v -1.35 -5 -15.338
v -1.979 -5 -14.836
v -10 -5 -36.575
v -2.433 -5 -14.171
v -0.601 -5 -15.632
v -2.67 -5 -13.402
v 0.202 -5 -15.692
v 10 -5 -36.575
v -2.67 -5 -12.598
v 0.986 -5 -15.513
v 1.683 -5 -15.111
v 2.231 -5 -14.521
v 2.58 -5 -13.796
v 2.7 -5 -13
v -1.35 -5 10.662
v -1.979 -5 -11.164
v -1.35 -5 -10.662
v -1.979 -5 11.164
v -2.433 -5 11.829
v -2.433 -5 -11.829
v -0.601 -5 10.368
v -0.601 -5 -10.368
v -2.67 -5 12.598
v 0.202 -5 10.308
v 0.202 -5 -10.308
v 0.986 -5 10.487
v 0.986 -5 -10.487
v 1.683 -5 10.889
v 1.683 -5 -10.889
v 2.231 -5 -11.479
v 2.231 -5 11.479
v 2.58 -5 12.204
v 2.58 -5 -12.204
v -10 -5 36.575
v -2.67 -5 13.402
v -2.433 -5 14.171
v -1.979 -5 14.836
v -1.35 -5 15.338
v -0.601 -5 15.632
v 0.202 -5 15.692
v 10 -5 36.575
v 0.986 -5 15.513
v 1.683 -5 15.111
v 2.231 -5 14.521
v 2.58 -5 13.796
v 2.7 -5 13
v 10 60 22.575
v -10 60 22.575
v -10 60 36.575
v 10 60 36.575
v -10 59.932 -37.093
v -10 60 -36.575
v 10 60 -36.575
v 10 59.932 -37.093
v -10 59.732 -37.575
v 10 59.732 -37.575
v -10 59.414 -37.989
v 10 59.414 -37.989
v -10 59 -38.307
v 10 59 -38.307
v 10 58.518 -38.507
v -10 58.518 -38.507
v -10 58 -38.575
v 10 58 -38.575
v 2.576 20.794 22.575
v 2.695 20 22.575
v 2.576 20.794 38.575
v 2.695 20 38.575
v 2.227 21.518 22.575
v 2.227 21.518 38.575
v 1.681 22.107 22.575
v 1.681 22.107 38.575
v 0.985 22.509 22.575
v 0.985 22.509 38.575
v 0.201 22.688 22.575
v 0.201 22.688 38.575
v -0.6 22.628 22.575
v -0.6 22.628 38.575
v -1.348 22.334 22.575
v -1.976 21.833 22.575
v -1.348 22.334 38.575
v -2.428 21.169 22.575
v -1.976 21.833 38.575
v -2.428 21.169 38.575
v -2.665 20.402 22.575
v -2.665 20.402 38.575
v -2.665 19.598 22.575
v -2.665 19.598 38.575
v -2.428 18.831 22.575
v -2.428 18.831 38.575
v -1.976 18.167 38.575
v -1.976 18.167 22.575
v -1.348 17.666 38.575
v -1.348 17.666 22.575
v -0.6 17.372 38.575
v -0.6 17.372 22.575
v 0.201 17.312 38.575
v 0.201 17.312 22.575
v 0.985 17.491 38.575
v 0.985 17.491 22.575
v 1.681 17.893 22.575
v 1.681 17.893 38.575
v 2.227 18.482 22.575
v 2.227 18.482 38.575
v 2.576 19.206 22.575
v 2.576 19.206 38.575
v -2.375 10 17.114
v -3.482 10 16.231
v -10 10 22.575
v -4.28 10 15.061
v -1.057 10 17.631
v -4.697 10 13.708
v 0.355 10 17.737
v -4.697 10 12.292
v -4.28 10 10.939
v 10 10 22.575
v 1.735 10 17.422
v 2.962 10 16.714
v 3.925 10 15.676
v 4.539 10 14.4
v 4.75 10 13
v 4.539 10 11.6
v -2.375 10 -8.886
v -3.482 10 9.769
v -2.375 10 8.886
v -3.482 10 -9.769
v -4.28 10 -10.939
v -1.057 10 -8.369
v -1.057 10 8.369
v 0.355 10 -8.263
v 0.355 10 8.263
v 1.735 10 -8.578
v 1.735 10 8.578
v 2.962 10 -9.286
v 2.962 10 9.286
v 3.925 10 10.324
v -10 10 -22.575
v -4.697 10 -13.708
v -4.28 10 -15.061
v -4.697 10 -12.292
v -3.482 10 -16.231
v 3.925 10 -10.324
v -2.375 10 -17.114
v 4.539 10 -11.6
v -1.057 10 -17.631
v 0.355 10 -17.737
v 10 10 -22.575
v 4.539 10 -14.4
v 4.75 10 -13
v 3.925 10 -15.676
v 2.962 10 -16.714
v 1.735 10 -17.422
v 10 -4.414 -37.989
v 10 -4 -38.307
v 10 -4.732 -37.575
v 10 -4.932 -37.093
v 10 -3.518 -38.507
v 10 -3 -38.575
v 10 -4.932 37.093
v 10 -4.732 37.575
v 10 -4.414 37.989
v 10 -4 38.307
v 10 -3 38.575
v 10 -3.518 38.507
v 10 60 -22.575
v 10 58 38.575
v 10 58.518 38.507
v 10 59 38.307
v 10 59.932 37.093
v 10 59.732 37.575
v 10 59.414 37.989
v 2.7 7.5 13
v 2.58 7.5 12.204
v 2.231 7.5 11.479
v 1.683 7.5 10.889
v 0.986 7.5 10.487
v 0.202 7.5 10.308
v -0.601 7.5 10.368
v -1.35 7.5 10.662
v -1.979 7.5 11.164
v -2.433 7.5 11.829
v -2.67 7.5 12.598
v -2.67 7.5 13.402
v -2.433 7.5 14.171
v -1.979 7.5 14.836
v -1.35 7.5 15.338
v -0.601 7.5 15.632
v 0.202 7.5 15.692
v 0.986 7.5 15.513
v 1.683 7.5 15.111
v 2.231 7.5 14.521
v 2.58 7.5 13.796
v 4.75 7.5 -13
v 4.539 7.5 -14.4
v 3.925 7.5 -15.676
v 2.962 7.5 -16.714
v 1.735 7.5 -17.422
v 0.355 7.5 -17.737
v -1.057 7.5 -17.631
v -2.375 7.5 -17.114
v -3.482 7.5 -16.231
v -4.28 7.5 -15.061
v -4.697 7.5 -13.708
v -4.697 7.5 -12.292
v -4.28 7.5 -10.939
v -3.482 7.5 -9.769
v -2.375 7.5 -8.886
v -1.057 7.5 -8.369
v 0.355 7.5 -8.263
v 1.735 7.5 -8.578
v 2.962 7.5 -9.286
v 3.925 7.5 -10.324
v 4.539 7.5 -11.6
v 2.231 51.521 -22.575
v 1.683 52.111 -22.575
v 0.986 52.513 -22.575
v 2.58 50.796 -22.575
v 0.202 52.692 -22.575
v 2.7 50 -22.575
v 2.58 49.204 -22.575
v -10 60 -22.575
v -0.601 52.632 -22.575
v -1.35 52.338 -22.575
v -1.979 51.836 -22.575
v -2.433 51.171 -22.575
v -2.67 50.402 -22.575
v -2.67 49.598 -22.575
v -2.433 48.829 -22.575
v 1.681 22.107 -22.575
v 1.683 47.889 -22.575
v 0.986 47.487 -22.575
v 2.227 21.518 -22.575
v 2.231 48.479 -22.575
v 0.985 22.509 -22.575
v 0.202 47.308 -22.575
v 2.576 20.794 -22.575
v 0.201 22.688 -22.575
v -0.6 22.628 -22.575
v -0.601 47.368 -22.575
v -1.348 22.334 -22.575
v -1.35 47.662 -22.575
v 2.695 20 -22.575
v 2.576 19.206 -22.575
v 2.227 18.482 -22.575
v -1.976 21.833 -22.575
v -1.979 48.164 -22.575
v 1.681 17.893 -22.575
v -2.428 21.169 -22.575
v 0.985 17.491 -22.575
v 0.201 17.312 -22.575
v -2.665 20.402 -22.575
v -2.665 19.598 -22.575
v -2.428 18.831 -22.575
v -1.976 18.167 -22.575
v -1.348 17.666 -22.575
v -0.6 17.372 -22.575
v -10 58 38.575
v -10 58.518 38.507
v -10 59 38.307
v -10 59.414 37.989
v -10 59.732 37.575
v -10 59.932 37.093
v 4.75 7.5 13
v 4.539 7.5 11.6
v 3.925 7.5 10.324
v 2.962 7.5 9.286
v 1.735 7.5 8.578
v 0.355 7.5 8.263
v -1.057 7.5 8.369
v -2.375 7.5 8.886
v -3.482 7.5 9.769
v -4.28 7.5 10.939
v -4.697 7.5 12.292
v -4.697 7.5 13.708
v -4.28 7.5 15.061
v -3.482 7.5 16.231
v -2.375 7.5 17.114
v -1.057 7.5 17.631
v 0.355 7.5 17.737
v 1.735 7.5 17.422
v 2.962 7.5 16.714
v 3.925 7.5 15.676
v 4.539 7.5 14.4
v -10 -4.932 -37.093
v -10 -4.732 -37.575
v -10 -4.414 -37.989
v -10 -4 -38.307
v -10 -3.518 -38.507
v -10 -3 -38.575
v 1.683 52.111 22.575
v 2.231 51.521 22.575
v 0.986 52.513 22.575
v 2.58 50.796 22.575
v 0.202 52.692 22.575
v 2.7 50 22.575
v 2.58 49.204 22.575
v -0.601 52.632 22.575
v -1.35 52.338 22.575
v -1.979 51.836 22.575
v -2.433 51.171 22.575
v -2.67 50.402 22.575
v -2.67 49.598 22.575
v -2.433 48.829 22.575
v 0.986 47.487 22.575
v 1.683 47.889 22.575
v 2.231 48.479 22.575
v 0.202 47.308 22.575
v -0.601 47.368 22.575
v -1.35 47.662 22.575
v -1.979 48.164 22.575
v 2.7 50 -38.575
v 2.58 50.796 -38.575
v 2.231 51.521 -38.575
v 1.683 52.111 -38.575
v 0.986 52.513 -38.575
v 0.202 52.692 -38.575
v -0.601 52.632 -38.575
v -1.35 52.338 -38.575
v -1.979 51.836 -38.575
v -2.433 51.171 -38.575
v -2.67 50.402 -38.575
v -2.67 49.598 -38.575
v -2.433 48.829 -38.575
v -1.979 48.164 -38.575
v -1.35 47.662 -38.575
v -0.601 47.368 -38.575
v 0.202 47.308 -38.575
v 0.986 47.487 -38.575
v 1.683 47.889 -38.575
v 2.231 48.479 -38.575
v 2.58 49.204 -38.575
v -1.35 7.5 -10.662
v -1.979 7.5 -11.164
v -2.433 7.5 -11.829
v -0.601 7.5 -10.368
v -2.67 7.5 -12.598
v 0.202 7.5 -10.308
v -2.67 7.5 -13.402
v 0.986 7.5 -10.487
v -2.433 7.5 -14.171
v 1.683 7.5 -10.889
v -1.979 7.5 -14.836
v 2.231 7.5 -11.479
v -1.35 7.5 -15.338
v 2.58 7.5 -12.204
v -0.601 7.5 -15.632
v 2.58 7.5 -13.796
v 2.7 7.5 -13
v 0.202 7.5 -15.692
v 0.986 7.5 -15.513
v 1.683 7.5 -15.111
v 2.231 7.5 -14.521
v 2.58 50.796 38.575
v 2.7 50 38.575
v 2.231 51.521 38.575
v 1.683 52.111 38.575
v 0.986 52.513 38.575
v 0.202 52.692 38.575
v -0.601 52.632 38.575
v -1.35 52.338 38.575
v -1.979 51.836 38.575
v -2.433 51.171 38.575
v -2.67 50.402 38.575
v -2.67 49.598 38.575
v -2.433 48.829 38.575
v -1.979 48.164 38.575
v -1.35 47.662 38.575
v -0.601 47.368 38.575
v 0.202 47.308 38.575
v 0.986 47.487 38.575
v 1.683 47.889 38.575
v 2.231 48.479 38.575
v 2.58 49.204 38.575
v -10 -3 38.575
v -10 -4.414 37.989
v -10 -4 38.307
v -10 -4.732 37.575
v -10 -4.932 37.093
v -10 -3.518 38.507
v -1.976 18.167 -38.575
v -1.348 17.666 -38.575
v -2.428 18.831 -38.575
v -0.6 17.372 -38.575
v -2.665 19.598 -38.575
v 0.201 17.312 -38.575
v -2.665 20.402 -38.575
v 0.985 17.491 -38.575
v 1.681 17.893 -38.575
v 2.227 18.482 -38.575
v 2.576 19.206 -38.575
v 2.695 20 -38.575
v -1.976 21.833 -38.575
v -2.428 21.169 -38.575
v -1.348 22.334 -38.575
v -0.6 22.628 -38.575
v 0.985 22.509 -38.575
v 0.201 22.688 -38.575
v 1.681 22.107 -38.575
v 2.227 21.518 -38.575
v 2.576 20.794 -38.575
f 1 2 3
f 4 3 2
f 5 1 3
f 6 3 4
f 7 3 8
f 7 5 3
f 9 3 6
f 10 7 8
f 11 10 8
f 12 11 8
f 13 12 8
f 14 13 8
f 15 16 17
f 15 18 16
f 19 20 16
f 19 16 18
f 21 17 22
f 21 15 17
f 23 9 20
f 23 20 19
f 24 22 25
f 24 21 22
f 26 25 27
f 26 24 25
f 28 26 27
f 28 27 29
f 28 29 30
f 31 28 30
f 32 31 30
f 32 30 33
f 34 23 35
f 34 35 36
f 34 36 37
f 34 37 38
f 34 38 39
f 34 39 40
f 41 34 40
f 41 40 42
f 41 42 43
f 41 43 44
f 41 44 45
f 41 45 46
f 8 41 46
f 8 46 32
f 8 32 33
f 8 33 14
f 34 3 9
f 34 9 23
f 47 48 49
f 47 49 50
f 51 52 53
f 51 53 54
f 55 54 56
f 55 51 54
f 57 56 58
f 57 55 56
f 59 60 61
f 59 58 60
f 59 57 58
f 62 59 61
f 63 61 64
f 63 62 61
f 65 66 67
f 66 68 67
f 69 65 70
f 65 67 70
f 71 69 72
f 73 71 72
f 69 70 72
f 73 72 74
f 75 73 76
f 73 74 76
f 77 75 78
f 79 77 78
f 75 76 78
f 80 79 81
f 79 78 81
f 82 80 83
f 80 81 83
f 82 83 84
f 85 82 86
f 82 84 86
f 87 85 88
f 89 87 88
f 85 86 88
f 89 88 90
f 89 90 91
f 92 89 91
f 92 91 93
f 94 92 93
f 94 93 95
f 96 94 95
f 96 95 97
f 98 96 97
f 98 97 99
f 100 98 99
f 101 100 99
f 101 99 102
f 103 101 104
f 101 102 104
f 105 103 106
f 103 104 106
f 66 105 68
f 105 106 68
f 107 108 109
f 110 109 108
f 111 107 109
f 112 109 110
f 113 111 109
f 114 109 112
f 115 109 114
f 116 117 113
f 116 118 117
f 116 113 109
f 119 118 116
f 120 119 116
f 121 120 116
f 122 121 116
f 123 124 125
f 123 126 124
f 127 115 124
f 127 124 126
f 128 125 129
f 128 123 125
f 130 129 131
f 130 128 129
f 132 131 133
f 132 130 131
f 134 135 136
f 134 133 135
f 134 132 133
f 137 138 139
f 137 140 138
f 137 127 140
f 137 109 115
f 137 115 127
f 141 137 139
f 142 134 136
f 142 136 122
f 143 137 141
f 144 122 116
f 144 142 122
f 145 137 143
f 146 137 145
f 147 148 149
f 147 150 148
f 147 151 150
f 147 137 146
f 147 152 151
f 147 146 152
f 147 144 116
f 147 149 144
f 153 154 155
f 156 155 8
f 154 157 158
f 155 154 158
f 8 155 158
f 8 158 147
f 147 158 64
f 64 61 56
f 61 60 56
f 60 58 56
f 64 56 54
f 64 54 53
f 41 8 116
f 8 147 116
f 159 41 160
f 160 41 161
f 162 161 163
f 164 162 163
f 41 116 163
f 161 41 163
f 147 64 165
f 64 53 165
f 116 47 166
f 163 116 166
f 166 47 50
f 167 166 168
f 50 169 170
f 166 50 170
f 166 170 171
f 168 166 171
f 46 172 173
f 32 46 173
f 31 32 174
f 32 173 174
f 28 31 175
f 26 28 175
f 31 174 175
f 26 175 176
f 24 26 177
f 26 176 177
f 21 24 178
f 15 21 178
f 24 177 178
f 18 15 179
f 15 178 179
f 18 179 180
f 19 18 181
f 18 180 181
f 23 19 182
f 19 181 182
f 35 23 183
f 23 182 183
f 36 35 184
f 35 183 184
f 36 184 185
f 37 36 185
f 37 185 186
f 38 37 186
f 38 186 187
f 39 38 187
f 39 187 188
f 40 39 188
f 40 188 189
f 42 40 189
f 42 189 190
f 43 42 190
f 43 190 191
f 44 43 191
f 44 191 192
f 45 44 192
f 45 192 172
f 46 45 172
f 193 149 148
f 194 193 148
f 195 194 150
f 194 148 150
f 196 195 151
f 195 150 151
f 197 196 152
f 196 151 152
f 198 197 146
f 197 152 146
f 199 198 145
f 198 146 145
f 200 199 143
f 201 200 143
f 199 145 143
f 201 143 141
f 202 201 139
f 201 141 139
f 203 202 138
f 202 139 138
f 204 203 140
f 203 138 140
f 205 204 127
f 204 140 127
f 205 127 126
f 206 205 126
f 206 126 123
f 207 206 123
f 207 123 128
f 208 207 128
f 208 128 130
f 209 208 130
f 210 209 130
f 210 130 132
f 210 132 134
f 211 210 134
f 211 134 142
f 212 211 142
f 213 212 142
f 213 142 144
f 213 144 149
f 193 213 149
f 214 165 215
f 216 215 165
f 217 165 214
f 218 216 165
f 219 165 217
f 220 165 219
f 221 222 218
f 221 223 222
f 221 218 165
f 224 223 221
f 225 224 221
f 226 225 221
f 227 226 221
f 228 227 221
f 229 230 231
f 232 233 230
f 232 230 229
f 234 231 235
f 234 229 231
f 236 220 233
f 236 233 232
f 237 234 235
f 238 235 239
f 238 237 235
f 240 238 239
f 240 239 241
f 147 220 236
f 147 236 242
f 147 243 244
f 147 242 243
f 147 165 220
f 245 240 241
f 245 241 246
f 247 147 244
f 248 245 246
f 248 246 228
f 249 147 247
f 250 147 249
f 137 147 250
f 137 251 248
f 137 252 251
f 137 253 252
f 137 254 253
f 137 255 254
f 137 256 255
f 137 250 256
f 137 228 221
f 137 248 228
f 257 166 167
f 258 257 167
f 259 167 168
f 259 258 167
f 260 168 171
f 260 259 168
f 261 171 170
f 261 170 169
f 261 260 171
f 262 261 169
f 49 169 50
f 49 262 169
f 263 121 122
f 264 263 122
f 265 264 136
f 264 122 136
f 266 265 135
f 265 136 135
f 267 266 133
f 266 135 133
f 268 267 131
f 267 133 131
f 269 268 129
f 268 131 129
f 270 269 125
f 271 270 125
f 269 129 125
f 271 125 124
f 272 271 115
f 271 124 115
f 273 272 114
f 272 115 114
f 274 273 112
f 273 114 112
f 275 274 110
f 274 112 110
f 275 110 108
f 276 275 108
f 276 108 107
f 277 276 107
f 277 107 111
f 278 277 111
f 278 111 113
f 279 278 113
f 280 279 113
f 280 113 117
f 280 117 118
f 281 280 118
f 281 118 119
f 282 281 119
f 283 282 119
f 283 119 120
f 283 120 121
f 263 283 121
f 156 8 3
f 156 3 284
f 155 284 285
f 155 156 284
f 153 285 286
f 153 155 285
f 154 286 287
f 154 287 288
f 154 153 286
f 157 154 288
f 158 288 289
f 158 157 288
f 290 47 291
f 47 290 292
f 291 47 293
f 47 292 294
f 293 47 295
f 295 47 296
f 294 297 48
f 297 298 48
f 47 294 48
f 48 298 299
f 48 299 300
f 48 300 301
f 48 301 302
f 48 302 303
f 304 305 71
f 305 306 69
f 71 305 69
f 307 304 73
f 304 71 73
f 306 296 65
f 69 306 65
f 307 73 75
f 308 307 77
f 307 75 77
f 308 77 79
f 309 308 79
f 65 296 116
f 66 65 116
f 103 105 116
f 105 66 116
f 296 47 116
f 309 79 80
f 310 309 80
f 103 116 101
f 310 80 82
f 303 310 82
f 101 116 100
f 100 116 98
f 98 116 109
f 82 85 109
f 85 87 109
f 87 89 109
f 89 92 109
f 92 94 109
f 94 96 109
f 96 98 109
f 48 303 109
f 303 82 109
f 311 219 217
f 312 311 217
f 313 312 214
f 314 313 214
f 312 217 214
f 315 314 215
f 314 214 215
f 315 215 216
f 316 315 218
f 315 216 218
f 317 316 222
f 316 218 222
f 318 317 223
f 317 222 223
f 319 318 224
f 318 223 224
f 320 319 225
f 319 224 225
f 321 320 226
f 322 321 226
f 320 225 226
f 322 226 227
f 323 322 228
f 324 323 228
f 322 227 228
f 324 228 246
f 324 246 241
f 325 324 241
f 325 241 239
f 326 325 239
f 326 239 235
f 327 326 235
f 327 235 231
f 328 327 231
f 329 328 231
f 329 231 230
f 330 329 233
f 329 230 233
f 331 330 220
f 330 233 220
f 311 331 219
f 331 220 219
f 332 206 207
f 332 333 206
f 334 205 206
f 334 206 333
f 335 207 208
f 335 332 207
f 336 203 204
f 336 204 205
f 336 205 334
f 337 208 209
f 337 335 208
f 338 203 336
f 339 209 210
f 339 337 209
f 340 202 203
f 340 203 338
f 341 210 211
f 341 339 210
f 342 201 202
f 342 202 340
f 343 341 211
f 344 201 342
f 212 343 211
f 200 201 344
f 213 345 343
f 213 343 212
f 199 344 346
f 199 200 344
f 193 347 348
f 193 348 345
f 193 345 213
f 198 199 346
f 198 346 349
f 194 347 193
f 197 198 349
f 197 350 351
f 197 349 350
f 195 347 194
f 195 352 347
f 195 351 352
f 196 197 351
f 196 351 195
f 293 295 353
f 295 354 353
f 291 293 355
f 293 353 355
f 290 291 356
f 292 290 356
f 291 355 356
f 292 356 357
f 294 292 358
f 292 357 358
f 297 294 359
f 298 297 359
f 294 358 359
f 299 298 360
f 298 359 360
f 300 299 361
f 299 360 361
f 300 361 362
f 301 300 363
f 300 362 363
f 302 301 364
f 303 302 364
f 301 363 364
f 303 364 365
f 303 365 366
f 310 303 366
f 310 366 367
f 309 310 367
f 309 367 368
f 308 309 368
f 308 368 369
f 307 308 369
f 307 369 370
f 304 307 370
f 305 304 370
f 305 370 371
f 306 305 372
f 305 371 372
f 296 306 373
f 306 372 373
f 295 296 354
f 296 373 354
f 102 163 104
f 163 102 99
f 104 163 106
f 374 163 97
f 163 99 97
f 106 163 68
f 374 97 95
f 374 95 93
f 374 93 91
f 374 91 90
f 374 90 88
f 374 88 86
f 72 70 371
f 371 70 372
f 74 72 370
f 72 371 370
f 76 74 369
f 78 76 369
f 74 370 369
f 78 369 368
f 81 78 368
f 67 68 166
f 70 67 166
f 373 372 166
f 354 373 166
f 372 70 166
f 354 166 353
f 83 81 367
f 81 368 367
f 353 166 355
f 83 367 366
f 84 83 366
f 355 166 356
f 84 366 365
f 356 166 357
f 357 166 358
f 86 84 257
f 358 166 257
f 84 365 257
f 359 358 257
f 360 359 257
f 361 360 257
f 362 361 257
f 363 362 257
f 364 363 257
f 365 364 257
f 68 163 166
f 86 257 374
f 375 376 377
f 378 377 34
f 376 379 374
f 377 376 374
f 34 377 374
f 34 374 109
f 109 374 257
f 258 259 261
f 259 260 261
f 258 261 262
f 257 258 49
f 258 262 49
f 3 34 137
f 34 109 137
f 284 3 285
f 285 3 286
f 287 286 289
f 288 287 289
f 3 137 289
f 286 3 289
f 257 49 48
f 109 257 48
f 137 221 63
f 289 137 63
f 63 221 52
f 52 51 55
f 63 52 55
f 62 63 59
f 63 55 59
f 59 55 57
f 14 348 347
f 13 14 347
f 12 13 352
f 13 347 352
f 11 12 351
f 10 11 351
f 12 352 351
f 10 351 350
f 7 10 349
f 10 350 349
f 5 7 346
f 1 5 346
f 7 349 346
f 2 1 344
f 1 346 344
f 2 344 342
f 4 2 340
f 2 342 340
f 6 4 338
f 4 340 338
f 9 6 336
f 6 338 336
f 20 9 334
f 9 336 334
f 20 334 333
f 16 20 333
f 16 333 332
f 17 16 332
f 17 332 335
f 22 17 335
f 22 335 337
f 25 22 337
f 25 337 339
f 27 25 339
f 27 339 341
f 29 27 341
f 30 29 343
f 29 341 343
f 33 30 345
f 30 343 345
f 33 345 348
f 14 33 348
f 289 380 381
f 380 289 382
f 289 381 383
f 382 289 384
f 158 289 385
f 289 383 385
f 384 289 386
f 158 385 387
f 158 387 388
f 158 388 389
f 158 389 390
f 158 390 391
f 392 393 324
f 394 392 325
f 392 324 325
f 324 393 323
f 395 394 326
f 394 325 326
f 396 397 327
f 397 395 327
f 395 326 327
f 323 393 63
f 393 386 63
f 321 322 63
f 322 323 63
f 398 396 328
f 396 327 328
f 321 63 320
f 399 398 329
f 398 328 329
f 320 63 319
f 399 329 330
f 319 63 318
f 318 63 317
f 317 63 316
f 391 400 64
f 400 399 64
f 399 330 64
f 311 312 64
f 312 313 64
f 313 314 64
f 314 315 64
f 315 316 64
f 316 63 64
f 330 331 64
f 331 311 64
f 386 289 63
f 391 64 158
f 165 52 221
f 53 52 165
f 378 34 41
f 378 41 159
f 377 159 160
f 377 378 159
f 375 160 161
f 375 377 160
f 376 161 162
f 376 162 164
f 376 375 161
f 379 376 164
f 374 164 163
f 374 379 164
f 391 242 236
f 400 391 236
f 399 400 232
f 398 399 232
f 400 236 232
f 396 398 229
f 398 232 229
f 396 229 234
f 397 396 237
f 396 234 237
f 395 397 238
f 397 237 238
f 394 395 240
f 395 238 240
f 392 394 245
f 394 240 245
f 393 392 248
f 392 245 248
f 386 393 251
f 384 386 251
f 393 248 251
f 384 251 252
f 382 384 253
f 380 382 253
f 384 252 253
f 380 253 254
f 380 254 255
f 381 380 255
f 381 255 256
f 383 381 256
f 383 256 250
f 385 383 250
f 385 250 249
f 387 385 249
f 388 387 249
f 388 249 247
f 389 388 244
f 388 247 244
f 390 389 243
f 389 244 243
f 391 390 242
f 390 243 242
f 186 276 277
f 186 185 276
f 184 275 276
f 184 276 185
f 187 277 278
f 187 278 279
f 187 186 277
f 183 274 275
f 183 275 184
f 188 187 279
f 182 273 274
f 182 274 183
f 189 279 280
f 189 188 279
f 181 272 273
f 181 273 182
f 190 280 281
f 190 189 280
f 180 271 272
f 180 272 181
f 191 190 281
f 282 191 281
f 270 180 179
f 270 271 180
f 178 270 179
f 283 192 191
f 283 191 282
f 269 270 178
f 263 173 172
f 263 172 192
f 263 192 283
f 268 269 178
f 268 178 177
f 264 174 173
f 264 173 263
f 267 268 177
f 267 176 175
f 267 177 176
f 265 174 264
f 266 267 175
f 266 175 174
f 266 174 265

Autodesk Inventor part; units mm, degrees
ref_plane "YZ Plane" through (0, 0, 0) normal (1, 0, 0) x (0, 1, 0)
ref_plane "XZ Plane" through (0, 0, 0) normal (0, 1, 0) x (-1, 0, 0)
ref_plane "XY Plane" through (0, 0, 0) normal (0, 0, 1) x (1, 0, 0)
sketch "Boceto1" plane through (0, 0, 0) normal (0, 1, 0) x (-1, 0, 0)
  line L0 (-6.45, 25.5) -> (6.45, 25.5)
  line L1 (6.45, 25.5) -> (6.45, -25.5)
  line L2 (6.45, -25.5) -> (-6.45, -25.5)
  line L3 (-6.45, -25.5) -> (-6.45, 25.5)
  line L4 (-6.45, 25.5) -> (6.45, -25.5) construction
  line L5 (6.45, 25.5) -> (-6.45, -25.5) construction
  circle A0 centre (0, 0) radius 3.5
  dimension "d0" = 7
  dimension "d1" = 51
  dimension "d2" = 12.9
extrude "Extrusión1" add sketch "Boceto1" along normal blind 10
sketch "Boceto2" plane through (0, 10, 0) normal (0, 1, 0) x (1, 0, 0)
  circle A0 centre (0, 0) radius 6
  dimension "d5" = 12
extrude "Extrusión2" cut sketch "Boceto2" against normal blind 6
sketch "Boceto3" plane through (0, 10, 0) normal (0, 1, 0) x (1, 0, 0)
  circle A0 centre (0, 0) radius 6 projected
  line L0 (6.45, 25.5) -> (-6.45, 25.5) projected
  line L1 (-6.45, 25.5) -> (-6.45, -25.5) projected
  line L2 (-6.45, -25.5) -> (6.45, -25.5) projected
  line L3 (6.45, -25.5) -> (6.45, 25.5) projected
  line L4 (10, -38.575) -> (-10, -38.575)
  line L5 (-10, -38.575) -> (-10, 38.575)
  line L6 (-10, 38.575) -> (10, 38.575)
  line L7 (10, 38.575) -> (10, -38.575)
  line L8 (10, -38.575) -> (-10, 38.575) construction
  line L9 (-10, -38.575) -> (10, 38.575) construction
  dimension "d21" = 20
  dimension "d22" = 77.15
extrude "Extrusión3" add sketch "Boceto3" against normal blind 15 contours L4 L5 L6 L7
sketch "Boceto4" plane through (0, 10, 0) normal (0, 1, 0) x (1, 0, 0)
  line L0 (10, -38.575) -> (-10, -38.575) projected
  line L1 (10, -38.575) -> (10, 38.575) projected
  line L2 (-10, -38.575) -> (10, -38.575)
  line L3 (10, -38.575) -> (10, -22.575)
  line L4 (10, -22.575) -> (-10, -22.575)
  line L5 (-10, -22.575) -> (-10, -38.575)
  line L6 (10, 38.575) -> (-10, 38.575) projected
  line L7 (-10, 38.575) -> (10, 38.575)
  line L8 (10, 38.575) -> (10, 22.575)
  line L9 (10, 22.575) -> (-10, 22.575)
  line L10 (-10, 22.575) -> (-10, 38.575)
  point P0 (0, 0)
  point P1 (10, 22.575)
  dimension "d12" = 16
  dimension "d13" = 16
extrude "Extrusión4" add sketch "Boceto4" along normal blind 50
sketch "Boceto5" plane through (-10, -5, 38.575) normal (0, 0, 1) x (1, 0, 0)
  circle A0 centre (10, 55) radius 2.7
  circle A1 centre (10, 25) radius 2.6954
  line L0 (0, 65) -> (20, 65) projected
  point P0 (10, 5)
  point P1 (20, 15)
  dimension "d16" = 5.4
  dimension "d17" = 10
  dimension "d18" = 10
extrude "Extrusión5" cut sketch "Boceto5" against normal through all
sketch "Boceto6" plane through (0, 10, 0) normal (0, 1, 0) x (1, 0, 0)
  circle A0 centre (0, 0) radius 6 projected
extrude "Extrusión6" add sketch "Boceto6" against normal up to surface (10 mm away)
sketch "Boceto7" plane through (0, -5, 0) normal (0, -1, 0) x (1, 0, 0)
  line L0 (-10, -38.575) -> (10, -38.575) projected
  line L1 (10, -38.575) -> (10, 38.575) projected
  line L2 (10, 38.575) -> (-10, 38.575) projected
  line L3 (-10, 38.575) -> (-10, -38.575) projected
  line L4 (6.45, 25.5) -> (6.45, -25.5) projected
  line L5 (6.45, -25.5) -> (-6.45, -25.5) projected
  line L6 (-6.45, -25.5) -> (-6.45, 25.5) projected
  line L7 (-6.45, 25.5) -> (6.45, 25.5) projected
  line L8 (6.45, -25.5) -> (-6.45, -25.5) projected
  line L9 (6.45, 25.5) -> (6.45, -25.5) projected
  line L10 (-6.45, 25.5) -> (6.45, 25.5) projected
  line L11 (-6.45, -25.5) -> (-6.45, 25.5) projected
  point P0 (0, 0)
extrude "Extrusión7" add sketch "Boceto7" against normal up to surface (5 mm away) contours L4 L5 L6 L7
sketch "Boceto8" plane through (0, 10, 0) normal (0, 1, 0) x (1, 0, 0)
  circle A0 centre (0, -13) radius 2.7
  circle A1 centre (0, 13) radius 2.7
  point P0 (0, 0)
  dimension "d27" = 5.4
  dimension "d28" = 13
  dimension "d29" = 13
extrude "Extrusión8" cut sketch "Boceto8" against normal through all
sketch "Boceto9" plane through (0, 10, 0) normal (0, 1, 0) x (1, 0, 0)
  circle A0 centre (0, -13) radius 2.7 projected
  circle A1 centre (0, -13) radius 4.75
  circle A2 centre (0, 13) radius 2.7 projected
  circle A3 centre (0, 13) radius 4.75
  point P0 (0, 0)
  dimension "d32" = 9.5
  dimension "d33" = 9.5
extrude "Extrusión9" cut sketch "Boceto9" against normal blind 2.5
fillet "Empalme1" radius 2 4 edges at (0, -5, 38.575) (0, 60, 38.575) (0, 60, -38.575) (0, -5, -38.575)
properties part number "LowerJaw"
